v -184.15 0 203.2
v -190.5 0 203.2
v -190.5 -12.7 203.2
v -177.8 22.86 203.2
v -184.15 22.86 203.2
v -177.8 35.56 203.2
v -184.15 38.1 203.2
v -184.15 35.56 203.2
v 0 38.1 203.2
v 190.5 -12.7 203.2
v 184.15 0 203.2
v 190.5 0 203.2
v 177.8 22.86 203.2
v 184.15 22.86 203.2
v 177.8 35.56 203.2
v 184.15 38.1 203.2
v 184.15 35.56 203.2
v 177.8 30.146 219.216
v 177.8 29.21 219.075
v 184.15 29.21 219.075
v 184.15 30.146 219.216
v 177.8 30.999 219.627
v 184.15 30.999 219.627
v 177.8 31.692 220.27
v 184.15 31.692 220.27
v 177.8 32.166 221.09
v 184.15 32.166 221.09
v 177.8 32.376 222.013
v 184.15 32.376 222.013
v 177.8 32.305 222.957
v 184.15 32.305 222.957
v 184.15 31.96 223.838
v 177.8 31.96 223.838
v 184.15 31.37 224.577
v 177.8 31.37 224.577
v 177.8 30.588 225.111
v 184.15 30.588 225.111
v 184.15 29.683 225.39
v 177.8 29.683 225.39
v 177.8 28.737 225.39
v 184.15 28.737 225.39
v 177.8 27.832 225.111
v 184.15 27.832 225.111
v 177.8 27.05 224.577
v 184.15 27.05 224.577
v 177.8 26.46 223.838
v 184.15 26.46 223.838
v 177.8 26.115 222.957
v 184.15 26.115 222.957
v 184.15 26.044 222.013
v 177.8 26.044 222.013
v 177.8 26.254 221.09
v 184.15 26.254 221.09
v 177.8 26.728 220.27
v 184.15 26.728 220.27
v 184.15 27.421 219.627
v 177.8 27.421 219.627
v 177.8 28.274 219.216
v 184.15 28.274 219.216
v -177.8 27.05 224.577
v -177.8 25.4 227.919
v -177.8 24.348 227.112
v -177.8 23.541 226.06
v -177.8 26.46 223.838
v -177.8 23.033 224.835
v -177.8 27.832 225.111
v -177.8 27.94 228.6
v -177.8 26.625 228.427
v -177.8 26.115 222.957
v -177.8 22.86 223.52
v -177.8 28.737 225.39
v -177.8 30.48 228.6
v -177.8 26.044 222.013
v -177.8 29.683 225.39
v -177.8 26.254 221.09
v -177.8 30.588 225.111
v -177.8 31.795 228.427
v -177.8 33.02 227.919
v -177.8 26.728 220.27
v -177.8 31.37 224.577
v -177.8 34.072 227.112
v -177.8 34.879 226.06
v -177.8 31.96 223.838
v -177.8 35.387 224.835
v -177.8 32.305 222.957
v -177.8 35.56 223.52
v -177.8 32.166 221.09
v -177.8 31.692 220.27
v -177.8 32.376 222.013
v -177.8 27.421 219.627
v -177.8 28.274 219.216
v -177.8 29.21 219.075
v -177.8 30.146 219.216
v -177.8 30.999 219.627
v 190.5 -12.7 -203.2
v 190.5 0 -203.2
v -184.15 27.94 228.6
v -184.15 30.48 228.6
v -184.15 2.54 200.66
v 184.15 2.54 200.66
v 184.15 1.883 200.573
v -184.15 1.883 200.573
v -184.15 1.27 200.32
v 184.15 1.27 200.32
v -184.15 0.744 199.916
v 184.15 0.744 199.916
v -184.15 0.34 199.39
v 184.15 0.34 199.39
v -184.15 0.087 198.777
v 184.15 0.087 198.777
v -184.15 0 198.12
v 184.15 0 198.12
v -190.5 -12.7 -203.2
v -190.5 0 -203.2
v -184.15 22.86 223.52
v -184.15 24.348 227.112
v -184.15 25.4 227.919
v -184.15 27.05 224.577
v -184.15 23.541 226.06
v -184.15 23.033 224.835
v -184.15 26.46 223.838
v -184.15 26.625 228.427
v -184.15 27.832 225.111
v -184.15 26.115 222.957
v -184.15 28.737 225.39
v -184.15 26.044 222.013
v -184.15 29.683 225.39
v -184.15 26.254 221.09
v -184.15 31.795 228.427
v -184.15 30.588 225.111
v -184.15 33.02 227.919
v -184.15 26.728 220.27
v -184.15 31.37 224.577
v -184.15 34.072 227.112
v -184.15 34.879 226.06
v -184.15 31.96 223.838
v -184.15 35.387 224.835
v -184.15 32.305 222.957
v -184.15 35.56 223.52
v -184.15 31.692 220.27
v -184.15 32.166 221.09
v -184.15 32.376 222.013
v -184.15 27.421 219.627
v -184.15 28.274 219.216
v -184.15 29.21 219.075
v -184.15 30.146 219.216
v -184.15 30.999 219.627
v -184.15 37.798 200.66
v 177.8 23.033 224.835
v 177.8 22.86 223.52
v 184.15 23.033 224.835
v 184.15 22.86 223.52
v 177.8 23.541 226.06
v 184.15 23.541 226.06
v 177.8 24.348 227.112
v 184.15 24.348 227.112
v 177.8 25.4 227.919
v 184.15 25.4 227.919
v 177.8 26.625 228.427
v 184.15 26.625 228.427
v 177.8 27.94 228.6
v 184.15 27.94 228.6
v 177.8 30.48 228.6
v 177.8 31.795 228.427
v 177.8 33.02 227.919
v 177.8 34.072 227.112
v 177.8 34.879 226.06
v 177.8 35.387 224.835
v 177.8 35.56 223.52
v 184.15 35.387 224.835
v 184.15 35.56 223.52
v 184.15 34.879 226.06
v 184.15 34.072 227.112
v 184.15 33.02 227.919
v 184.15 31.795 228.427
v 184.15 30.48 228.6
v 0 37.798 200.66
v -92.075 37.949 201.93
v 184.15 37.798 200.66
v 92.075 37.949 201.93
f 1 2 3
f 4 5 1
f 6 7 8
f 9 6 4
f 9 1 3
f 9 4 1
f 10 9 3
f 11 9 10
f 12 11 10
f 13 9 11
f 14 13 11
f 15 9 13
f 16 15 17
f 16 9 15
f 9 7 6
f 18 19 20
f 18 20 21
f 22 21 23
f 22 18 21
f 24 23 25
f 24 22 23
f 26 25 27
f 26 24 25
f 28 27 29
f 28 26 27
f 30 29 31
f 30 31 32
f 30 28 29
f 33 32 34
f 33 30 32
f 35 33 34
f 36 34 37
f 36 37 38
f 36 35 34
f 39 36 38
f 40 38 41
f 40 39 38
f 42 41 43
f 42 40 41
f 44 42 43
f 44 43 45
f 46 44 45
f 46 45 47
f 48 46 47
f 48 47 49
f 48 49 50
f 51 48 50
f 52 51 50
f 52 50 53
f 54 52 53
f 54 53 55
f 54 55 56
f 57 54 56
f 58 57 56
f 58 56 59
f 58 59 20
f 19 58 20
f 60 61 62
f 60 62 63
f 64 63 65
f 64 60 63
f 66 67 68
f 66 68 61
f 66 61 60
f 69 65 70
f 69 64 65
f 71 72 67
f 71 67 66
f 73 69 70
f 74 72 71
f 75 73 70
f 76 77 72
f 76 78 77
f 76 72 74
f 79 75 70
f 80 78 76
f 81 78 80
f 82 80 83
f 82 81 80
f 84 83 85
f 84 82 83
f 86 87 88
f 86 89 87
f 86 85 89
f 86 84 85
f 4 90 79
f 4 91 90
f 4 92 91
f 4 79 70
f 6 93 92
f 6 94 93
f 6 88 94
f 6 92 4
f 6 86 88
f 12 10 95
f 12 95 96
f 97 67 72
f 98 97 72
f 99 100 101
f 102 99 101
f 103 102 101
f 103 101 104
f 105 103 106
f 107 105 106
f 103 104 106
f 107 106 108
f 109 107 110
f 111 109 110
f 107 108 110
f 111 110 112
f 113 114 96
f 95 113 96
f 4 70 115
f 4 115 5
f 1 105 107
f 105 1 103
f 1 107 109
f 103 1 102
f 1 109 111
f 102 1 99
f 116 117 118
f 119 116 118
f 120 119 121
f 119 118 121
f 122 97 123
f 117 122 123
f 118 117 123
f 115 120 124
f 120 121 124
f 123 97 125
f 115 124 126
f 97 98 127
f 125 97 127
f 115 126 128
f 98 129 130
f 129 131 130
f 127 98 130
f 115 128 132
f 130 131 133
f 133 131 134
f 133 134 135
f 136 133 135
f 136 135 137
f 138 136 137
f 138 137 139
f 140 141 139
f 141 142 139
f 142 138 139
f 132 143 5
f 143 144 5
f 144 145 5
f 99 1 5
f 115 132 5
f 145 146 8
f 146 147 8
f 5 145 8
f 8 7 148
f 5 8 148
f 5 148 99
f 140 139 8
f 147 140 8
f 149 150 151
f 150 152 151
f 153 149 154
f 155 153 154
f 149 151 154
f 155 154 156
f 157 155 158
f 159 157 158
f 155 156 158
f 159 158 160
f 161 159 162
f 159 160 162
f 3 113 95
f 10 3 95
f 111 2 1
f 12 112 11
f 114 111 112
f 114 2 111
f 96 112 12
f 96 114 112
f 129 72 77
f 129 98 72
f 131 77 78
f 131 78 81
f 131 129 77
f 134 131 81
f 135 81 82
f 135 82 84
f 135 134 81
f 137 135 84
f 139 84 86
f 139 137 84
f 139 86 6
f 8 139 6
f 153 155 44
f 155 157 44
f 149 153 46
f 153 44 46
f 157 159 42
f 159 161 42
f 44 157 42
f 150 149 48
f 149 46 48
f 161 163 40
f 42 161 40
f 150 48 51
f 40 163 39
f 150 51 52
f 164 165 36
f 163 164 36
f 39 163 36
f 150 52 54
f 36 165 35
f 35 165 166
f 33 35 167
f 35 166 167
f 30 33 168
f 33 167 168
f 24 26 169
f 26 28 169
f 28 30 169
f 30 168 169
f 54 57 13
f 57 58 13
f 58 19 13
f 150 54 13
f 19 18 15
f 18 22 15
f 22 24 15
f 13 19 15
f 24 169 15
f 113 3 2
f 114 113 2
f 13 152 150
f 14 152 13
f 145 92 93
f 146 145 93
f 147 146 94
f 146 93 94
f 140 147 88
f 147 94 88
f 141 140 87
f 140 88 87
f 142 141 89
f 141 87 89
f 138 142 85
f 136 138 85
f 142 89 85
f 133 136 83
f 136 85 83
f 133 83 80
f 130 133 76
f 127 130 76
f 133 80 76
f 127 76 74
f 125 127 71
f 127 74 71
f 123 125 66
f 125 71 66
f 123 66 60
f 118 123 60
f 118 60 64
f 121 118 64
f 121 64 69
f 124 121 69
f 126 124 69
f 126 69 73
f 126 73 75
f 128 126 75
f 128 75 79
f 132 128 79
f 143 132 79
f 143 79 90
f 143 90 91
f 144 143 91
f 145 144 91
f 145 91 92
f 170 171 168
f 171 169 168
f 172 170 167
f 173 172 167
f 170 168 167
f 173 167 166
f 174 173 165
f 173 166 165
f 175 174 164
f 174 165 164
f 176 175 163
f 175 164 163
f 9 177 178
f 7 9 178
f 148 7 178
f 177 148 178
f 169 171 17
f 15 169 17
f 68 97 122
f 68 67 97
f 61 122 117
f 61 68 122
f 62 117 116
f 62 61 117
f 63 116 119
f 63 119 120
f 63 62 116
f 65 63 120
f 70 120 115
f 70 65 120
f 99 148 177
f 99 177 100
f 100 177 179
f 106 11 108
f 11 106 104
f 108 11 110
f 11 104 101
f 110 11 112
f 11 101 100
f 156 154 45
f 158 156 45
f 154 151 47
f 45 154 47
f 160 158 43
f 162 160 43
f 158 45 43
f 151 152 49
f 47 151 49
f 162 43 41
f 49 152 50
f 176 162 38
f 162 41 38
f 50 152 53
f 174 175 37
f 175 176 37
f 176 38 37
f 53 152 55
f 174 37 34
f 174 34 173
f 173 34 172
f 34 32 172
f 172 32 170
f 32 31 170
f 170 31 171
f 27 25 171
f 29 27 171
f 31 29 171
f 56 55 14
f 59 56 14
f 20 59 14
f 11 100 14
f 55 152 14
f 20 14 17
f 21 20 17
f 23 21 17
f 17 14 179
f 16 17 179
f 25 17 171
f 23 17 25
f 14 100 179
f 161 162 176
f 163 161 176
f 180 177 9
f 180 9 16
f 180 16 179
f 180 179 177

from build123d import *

# Parameters (mm, degrees)
SKETCH1_W                = 381
SKETCH1_H                = 406.4
BOSS_EXTRUDE1_DEPTH      = 12.7
CUT_EXTRUDE1_DEPTH       = 530.86
BOSS_EXTRUDE2_DEPTH      = 190.5
BOSS_EXTRUDE2_DEPTH_BACK = 190.5
CUT_EXTRUDE2_DEPTH       = 185.42
CUT_EXTRUDE2_DEPTH_BACK  = 185.42
SKETCH9_W                = 370.84
SKETCH9_H                = 38.1
BOSS_EXTRUDE3_DEPTH      = 203.2
SKETCH9_2_W              = 370.84
SKETCH9_2_H              = 38.1
CUT_EXTRUDE3_DEPTH       = 200.66
FILLET12_R               = 2.54
SKETCH20_W               = 381
SKETCH20_H               = 12.7
BOSS_EXTRUDE5_DEPTH      = 406.4
CUT_EXTRUDE10_DEPTH      = 304.8
CUT_EXTRUDE10_DEPTH_BACK = 259.334
SKETCH27_W               = 25.4
SKETCH27_H               = 12.7
SKETCH27_R               = 3.175
BOSS_EXTRUDE6_DEPTH      = 184.15
BOSS_EXTRUDE6_DEPTH_BACK = 184.15
SKETCH27_2_W             = 25.4
SKETCH27_2_H             = 12.7
SKETCH27_2_R             = 3.175
CUT_EXTRUDE11_DEPTH      = 177.8
CUT_EXTRUDE11_DEPTH_BACK = 177.8
FILLET14_R               = 5.08
SKETCH29_W               = 6.35
SKETCH29_H               = 38.1
CUT_EXTRUDE12_DEPTH      = 229.6
CUT_EXTRUDE12_DEPTH_BACK = 204.2000001


with BuildPart() as part:
    # Sketch1 → Boss-Extrude1 (new body)
    with BuildSketch(Plane(origin=(0, 0, 0), x_dir=(1, 0, 0), z_dir=(0, 1, 0))):
        Rectangle(SKETCH1_W, SKETCH1_H)
    extrude(amount=-BOSS_EXTRUDE1_DEPTH)

    # Sketch5 → Cut-Extrude1 (cut)
    with BuildSketch(Plane(origin=(0, 0, -203.2), x_dir=(-1, 0, 0), z_dir=(0, 0, -1))):
        Polygon((190.5, 0), (0, -12.7), (190.5, -12.7), align=None)
        Polygon((0, -12.7), (-190.5, 0), (-190.5, -12.7), align=None)
    extrude(amount=-CUT_EXTRUDE1_DEPTH, mode=Mode.SUBTRACT)

    # Sketch6 → Boss-Extrude2 (add, two sides)
    with BuildSketch(Plane(origin=(0, 0, 0), x_dir=(0, 0, -1), z_dir=(1, 0, 0))) as boss_extrude2_sk:
        with BuildLine():
            Line((-203.2, 0), (-203.2, 38.1))
            add(Edge.make_bspline(
                [(-203.2, 38.1), (-139.671233151, 43.854392756), (-4.575804842, 44.131584557), (127.011271564, 22.260123732), (203.2, 0)],
                knots=[0, 0, 0, 0, 0.446112954, 1, 1, 1, 1], degree=3))
            Line((203.2, 0), (-203.2, 0))
        make_face()
    extrude(amount=BOSS_EXTRUDE2_DEPTH)
    extrude(boss_extrude2_sk.sketch, amount=-BOSS_EXTRUDE2_DEPTH_BACK)

    # Sketch6<2> → Cut-Extrude2 (cut, two sides)
    with BuildSketch(Plane(origin=(0, 0, 0), x_dir=(0, 0, -1), z_dir=(1, 0, 0))) as cut_extrude2_sk:
        with BuildLine():
            Line((-203.2, 0), (-203.2, 38.1))
            add(Edge.make_bspline(
                [(-203.2, 38.1), (-139.671233151, 43.854392756), (-4.575804842, 44.131584557), (127.011271564, 22.260123732), (203.2, 0)],
                knots=[0, 0, 0, 0, 0.446112954, 1, 1, 1, 1], degree=3))
            Line((203.2, 0), (-203.2, 0))
        make_face()
    extrude(amount=CUT_EXTRUDE2_DEPTH, mode=Mode.SUBTRACT)
    extrude(cut_extrude2_sk.sketch, amount=-CUT_EXTRUDE2_DEPTH_BACK, mode=Mode.SUBTRACT)

    # Sketch9 → Boss-Extrude3 (add)
    with BuildSketch(Plane.XY):
        with Locations((0, 19.05)):
            Rectangle(SKETCH9_W, SKETCH9_H)
    extrude(amount=BOSS_EXTRUDE3_DEPTH)

    # Sketch9<2> → Cut-Extrude3 (cut)
    with BuildSketch(Plane.XY):
        with Locations((0, 19.05)):
            Rectangle(SKETCH9_2_W, SKETCH9_2_H)
    extrude(amount=CUT_EXTRUDE3_DEPTH, mode=Mode.SUBTRACT)

    # Fillet12
    fillet12_edges = [part.edges().sort_by_distance(p)[0] for p in [
        (0, 0, 200.66),
    ]]
    fillet(fillet12_edges, radius=FILLET12_R)

    # Sketch20 → Boss-Extrude5 (add)
    with BuildSketch(Plane.XY.offset(203.2)):
        with Locations((0, -6.35)):
            Rectangle(SKETCH20_W, SKETCH20_H)
    extrude(amount=-BOSS_EXTRUDE5_DEPTH)

    # Sketch21 → Cut-Extrude10 (cut, two sides)
    with BuildSketch(Plane(origin=(0, 0, 0), x_dir=(0, 0, -1), z_dir=(1, 0, 0))) as cut_extrude10_sk:
        with BuildLine():
            Line((-203.2, 38.1), (-203.2, 89.275464314))
            Line((-203.2, 89.275464314), (140.49634993, 63.687732157))
            Line((140.49634993, 63.687732157), (140.49634993, 16.247140788))
            add(Edge.make_bspline(
                [(-203.2, 38.1), (-32.059595942, 17.691928411), (140.49634993, 16.247140788)],
                knots=[0, 0, 0, 1, 1, 1], degree=2))
        make_face()
    extrude(amount=CUT_EXTRUDE10_DEPTH, mode=Mode.SUBTRACT)
    extrude(cut_extrude10_sk.sketch, amount=-CUT_EXTRUDE10_DEPTH_BACK, mode=Mode.SUBTRACT)

    # Sketch27 → Boss-Extrude6 (add, two sides)
    with BuildSketch(Plane(origin=(0, 0, 0), x_dir=(0, 0, -1), z_dir=(1, 0, 0))) as boss_extrude6_sk:
        with Locations((-215.9, 29.21)):
            Rectangle(SKETCH27_W, SKETCH27_H)
        with Locations((-222.25, 29.21)):
            Circle(SKETCH27_R, mode=Mode.SUBTRACT)
    extrude(amount=BOSS_EXTRUDE6_DEPTH)
    extrude(boss_extrude6_sk.sketch, amount=-BOSS_EXTRUDE6_DEPTH_BACK)

    # Sketch27<2> → Cut-Extrude11 (cut, two sides)
    with BuildSketch(Plane(origin=(0, 0, 0), x_dir=(0, 0, -1), z_dir=(1, 0, 0))) as cut_extrude11_sk:
        with Locations((-215.9, 29.21)):
            Rectangle(SKETCH27_2_W, SKETCH27_2_H)
        with Locations((-222.25, 29.21)):
            Circle(SKETCH27_2_R, mode=Mode.SUBTRACT)
    extrude(amount=CUT_EXTRUDE11_DEPTH, mode=Mode.SUBTRACT)
    extrude(cut_extrude11_sk.sketch, amount=-CUT_EXTRUDE11_DEPTH_BACK, mode=Mode.SUBTRACT)

    # Fillet14
    fillet14_edges = [part.edges().sort_by_distance(p)[0] for p in [
        (-180.975, 22.86, 228.6),
        (-180.975, 35.56, 228.6),
        (180.975, 35.56, 228.6),
        (180.975, 22.86, 228.6),
    ]]
    fillet(fillet14_edges, radius=FILLET14_R)

    # Sketch29 → Cut-Extrude12 (cut, two sides)
    with BuildSketch(Plane.XY) as cut_extrude12_sk:
        with Locations((-187.325, 19.05)):
            Rectangle(SKETCH29_W, SKETCH29_H)
        with Locations((187.325, 19.05)):
            Rectangle(SKETCH29_W, SKETCH29_H)
    extrude(amount=CUT_EXTRUDE12_DEPTH, mode=Mode.SUBTRACT)
    extrude(cut_extrude12_sk.sketch, amount=-CUT_EXTRUDE12_DEPTH_BACK, mode=Mode.SUBTRACT)


solid = part.part
